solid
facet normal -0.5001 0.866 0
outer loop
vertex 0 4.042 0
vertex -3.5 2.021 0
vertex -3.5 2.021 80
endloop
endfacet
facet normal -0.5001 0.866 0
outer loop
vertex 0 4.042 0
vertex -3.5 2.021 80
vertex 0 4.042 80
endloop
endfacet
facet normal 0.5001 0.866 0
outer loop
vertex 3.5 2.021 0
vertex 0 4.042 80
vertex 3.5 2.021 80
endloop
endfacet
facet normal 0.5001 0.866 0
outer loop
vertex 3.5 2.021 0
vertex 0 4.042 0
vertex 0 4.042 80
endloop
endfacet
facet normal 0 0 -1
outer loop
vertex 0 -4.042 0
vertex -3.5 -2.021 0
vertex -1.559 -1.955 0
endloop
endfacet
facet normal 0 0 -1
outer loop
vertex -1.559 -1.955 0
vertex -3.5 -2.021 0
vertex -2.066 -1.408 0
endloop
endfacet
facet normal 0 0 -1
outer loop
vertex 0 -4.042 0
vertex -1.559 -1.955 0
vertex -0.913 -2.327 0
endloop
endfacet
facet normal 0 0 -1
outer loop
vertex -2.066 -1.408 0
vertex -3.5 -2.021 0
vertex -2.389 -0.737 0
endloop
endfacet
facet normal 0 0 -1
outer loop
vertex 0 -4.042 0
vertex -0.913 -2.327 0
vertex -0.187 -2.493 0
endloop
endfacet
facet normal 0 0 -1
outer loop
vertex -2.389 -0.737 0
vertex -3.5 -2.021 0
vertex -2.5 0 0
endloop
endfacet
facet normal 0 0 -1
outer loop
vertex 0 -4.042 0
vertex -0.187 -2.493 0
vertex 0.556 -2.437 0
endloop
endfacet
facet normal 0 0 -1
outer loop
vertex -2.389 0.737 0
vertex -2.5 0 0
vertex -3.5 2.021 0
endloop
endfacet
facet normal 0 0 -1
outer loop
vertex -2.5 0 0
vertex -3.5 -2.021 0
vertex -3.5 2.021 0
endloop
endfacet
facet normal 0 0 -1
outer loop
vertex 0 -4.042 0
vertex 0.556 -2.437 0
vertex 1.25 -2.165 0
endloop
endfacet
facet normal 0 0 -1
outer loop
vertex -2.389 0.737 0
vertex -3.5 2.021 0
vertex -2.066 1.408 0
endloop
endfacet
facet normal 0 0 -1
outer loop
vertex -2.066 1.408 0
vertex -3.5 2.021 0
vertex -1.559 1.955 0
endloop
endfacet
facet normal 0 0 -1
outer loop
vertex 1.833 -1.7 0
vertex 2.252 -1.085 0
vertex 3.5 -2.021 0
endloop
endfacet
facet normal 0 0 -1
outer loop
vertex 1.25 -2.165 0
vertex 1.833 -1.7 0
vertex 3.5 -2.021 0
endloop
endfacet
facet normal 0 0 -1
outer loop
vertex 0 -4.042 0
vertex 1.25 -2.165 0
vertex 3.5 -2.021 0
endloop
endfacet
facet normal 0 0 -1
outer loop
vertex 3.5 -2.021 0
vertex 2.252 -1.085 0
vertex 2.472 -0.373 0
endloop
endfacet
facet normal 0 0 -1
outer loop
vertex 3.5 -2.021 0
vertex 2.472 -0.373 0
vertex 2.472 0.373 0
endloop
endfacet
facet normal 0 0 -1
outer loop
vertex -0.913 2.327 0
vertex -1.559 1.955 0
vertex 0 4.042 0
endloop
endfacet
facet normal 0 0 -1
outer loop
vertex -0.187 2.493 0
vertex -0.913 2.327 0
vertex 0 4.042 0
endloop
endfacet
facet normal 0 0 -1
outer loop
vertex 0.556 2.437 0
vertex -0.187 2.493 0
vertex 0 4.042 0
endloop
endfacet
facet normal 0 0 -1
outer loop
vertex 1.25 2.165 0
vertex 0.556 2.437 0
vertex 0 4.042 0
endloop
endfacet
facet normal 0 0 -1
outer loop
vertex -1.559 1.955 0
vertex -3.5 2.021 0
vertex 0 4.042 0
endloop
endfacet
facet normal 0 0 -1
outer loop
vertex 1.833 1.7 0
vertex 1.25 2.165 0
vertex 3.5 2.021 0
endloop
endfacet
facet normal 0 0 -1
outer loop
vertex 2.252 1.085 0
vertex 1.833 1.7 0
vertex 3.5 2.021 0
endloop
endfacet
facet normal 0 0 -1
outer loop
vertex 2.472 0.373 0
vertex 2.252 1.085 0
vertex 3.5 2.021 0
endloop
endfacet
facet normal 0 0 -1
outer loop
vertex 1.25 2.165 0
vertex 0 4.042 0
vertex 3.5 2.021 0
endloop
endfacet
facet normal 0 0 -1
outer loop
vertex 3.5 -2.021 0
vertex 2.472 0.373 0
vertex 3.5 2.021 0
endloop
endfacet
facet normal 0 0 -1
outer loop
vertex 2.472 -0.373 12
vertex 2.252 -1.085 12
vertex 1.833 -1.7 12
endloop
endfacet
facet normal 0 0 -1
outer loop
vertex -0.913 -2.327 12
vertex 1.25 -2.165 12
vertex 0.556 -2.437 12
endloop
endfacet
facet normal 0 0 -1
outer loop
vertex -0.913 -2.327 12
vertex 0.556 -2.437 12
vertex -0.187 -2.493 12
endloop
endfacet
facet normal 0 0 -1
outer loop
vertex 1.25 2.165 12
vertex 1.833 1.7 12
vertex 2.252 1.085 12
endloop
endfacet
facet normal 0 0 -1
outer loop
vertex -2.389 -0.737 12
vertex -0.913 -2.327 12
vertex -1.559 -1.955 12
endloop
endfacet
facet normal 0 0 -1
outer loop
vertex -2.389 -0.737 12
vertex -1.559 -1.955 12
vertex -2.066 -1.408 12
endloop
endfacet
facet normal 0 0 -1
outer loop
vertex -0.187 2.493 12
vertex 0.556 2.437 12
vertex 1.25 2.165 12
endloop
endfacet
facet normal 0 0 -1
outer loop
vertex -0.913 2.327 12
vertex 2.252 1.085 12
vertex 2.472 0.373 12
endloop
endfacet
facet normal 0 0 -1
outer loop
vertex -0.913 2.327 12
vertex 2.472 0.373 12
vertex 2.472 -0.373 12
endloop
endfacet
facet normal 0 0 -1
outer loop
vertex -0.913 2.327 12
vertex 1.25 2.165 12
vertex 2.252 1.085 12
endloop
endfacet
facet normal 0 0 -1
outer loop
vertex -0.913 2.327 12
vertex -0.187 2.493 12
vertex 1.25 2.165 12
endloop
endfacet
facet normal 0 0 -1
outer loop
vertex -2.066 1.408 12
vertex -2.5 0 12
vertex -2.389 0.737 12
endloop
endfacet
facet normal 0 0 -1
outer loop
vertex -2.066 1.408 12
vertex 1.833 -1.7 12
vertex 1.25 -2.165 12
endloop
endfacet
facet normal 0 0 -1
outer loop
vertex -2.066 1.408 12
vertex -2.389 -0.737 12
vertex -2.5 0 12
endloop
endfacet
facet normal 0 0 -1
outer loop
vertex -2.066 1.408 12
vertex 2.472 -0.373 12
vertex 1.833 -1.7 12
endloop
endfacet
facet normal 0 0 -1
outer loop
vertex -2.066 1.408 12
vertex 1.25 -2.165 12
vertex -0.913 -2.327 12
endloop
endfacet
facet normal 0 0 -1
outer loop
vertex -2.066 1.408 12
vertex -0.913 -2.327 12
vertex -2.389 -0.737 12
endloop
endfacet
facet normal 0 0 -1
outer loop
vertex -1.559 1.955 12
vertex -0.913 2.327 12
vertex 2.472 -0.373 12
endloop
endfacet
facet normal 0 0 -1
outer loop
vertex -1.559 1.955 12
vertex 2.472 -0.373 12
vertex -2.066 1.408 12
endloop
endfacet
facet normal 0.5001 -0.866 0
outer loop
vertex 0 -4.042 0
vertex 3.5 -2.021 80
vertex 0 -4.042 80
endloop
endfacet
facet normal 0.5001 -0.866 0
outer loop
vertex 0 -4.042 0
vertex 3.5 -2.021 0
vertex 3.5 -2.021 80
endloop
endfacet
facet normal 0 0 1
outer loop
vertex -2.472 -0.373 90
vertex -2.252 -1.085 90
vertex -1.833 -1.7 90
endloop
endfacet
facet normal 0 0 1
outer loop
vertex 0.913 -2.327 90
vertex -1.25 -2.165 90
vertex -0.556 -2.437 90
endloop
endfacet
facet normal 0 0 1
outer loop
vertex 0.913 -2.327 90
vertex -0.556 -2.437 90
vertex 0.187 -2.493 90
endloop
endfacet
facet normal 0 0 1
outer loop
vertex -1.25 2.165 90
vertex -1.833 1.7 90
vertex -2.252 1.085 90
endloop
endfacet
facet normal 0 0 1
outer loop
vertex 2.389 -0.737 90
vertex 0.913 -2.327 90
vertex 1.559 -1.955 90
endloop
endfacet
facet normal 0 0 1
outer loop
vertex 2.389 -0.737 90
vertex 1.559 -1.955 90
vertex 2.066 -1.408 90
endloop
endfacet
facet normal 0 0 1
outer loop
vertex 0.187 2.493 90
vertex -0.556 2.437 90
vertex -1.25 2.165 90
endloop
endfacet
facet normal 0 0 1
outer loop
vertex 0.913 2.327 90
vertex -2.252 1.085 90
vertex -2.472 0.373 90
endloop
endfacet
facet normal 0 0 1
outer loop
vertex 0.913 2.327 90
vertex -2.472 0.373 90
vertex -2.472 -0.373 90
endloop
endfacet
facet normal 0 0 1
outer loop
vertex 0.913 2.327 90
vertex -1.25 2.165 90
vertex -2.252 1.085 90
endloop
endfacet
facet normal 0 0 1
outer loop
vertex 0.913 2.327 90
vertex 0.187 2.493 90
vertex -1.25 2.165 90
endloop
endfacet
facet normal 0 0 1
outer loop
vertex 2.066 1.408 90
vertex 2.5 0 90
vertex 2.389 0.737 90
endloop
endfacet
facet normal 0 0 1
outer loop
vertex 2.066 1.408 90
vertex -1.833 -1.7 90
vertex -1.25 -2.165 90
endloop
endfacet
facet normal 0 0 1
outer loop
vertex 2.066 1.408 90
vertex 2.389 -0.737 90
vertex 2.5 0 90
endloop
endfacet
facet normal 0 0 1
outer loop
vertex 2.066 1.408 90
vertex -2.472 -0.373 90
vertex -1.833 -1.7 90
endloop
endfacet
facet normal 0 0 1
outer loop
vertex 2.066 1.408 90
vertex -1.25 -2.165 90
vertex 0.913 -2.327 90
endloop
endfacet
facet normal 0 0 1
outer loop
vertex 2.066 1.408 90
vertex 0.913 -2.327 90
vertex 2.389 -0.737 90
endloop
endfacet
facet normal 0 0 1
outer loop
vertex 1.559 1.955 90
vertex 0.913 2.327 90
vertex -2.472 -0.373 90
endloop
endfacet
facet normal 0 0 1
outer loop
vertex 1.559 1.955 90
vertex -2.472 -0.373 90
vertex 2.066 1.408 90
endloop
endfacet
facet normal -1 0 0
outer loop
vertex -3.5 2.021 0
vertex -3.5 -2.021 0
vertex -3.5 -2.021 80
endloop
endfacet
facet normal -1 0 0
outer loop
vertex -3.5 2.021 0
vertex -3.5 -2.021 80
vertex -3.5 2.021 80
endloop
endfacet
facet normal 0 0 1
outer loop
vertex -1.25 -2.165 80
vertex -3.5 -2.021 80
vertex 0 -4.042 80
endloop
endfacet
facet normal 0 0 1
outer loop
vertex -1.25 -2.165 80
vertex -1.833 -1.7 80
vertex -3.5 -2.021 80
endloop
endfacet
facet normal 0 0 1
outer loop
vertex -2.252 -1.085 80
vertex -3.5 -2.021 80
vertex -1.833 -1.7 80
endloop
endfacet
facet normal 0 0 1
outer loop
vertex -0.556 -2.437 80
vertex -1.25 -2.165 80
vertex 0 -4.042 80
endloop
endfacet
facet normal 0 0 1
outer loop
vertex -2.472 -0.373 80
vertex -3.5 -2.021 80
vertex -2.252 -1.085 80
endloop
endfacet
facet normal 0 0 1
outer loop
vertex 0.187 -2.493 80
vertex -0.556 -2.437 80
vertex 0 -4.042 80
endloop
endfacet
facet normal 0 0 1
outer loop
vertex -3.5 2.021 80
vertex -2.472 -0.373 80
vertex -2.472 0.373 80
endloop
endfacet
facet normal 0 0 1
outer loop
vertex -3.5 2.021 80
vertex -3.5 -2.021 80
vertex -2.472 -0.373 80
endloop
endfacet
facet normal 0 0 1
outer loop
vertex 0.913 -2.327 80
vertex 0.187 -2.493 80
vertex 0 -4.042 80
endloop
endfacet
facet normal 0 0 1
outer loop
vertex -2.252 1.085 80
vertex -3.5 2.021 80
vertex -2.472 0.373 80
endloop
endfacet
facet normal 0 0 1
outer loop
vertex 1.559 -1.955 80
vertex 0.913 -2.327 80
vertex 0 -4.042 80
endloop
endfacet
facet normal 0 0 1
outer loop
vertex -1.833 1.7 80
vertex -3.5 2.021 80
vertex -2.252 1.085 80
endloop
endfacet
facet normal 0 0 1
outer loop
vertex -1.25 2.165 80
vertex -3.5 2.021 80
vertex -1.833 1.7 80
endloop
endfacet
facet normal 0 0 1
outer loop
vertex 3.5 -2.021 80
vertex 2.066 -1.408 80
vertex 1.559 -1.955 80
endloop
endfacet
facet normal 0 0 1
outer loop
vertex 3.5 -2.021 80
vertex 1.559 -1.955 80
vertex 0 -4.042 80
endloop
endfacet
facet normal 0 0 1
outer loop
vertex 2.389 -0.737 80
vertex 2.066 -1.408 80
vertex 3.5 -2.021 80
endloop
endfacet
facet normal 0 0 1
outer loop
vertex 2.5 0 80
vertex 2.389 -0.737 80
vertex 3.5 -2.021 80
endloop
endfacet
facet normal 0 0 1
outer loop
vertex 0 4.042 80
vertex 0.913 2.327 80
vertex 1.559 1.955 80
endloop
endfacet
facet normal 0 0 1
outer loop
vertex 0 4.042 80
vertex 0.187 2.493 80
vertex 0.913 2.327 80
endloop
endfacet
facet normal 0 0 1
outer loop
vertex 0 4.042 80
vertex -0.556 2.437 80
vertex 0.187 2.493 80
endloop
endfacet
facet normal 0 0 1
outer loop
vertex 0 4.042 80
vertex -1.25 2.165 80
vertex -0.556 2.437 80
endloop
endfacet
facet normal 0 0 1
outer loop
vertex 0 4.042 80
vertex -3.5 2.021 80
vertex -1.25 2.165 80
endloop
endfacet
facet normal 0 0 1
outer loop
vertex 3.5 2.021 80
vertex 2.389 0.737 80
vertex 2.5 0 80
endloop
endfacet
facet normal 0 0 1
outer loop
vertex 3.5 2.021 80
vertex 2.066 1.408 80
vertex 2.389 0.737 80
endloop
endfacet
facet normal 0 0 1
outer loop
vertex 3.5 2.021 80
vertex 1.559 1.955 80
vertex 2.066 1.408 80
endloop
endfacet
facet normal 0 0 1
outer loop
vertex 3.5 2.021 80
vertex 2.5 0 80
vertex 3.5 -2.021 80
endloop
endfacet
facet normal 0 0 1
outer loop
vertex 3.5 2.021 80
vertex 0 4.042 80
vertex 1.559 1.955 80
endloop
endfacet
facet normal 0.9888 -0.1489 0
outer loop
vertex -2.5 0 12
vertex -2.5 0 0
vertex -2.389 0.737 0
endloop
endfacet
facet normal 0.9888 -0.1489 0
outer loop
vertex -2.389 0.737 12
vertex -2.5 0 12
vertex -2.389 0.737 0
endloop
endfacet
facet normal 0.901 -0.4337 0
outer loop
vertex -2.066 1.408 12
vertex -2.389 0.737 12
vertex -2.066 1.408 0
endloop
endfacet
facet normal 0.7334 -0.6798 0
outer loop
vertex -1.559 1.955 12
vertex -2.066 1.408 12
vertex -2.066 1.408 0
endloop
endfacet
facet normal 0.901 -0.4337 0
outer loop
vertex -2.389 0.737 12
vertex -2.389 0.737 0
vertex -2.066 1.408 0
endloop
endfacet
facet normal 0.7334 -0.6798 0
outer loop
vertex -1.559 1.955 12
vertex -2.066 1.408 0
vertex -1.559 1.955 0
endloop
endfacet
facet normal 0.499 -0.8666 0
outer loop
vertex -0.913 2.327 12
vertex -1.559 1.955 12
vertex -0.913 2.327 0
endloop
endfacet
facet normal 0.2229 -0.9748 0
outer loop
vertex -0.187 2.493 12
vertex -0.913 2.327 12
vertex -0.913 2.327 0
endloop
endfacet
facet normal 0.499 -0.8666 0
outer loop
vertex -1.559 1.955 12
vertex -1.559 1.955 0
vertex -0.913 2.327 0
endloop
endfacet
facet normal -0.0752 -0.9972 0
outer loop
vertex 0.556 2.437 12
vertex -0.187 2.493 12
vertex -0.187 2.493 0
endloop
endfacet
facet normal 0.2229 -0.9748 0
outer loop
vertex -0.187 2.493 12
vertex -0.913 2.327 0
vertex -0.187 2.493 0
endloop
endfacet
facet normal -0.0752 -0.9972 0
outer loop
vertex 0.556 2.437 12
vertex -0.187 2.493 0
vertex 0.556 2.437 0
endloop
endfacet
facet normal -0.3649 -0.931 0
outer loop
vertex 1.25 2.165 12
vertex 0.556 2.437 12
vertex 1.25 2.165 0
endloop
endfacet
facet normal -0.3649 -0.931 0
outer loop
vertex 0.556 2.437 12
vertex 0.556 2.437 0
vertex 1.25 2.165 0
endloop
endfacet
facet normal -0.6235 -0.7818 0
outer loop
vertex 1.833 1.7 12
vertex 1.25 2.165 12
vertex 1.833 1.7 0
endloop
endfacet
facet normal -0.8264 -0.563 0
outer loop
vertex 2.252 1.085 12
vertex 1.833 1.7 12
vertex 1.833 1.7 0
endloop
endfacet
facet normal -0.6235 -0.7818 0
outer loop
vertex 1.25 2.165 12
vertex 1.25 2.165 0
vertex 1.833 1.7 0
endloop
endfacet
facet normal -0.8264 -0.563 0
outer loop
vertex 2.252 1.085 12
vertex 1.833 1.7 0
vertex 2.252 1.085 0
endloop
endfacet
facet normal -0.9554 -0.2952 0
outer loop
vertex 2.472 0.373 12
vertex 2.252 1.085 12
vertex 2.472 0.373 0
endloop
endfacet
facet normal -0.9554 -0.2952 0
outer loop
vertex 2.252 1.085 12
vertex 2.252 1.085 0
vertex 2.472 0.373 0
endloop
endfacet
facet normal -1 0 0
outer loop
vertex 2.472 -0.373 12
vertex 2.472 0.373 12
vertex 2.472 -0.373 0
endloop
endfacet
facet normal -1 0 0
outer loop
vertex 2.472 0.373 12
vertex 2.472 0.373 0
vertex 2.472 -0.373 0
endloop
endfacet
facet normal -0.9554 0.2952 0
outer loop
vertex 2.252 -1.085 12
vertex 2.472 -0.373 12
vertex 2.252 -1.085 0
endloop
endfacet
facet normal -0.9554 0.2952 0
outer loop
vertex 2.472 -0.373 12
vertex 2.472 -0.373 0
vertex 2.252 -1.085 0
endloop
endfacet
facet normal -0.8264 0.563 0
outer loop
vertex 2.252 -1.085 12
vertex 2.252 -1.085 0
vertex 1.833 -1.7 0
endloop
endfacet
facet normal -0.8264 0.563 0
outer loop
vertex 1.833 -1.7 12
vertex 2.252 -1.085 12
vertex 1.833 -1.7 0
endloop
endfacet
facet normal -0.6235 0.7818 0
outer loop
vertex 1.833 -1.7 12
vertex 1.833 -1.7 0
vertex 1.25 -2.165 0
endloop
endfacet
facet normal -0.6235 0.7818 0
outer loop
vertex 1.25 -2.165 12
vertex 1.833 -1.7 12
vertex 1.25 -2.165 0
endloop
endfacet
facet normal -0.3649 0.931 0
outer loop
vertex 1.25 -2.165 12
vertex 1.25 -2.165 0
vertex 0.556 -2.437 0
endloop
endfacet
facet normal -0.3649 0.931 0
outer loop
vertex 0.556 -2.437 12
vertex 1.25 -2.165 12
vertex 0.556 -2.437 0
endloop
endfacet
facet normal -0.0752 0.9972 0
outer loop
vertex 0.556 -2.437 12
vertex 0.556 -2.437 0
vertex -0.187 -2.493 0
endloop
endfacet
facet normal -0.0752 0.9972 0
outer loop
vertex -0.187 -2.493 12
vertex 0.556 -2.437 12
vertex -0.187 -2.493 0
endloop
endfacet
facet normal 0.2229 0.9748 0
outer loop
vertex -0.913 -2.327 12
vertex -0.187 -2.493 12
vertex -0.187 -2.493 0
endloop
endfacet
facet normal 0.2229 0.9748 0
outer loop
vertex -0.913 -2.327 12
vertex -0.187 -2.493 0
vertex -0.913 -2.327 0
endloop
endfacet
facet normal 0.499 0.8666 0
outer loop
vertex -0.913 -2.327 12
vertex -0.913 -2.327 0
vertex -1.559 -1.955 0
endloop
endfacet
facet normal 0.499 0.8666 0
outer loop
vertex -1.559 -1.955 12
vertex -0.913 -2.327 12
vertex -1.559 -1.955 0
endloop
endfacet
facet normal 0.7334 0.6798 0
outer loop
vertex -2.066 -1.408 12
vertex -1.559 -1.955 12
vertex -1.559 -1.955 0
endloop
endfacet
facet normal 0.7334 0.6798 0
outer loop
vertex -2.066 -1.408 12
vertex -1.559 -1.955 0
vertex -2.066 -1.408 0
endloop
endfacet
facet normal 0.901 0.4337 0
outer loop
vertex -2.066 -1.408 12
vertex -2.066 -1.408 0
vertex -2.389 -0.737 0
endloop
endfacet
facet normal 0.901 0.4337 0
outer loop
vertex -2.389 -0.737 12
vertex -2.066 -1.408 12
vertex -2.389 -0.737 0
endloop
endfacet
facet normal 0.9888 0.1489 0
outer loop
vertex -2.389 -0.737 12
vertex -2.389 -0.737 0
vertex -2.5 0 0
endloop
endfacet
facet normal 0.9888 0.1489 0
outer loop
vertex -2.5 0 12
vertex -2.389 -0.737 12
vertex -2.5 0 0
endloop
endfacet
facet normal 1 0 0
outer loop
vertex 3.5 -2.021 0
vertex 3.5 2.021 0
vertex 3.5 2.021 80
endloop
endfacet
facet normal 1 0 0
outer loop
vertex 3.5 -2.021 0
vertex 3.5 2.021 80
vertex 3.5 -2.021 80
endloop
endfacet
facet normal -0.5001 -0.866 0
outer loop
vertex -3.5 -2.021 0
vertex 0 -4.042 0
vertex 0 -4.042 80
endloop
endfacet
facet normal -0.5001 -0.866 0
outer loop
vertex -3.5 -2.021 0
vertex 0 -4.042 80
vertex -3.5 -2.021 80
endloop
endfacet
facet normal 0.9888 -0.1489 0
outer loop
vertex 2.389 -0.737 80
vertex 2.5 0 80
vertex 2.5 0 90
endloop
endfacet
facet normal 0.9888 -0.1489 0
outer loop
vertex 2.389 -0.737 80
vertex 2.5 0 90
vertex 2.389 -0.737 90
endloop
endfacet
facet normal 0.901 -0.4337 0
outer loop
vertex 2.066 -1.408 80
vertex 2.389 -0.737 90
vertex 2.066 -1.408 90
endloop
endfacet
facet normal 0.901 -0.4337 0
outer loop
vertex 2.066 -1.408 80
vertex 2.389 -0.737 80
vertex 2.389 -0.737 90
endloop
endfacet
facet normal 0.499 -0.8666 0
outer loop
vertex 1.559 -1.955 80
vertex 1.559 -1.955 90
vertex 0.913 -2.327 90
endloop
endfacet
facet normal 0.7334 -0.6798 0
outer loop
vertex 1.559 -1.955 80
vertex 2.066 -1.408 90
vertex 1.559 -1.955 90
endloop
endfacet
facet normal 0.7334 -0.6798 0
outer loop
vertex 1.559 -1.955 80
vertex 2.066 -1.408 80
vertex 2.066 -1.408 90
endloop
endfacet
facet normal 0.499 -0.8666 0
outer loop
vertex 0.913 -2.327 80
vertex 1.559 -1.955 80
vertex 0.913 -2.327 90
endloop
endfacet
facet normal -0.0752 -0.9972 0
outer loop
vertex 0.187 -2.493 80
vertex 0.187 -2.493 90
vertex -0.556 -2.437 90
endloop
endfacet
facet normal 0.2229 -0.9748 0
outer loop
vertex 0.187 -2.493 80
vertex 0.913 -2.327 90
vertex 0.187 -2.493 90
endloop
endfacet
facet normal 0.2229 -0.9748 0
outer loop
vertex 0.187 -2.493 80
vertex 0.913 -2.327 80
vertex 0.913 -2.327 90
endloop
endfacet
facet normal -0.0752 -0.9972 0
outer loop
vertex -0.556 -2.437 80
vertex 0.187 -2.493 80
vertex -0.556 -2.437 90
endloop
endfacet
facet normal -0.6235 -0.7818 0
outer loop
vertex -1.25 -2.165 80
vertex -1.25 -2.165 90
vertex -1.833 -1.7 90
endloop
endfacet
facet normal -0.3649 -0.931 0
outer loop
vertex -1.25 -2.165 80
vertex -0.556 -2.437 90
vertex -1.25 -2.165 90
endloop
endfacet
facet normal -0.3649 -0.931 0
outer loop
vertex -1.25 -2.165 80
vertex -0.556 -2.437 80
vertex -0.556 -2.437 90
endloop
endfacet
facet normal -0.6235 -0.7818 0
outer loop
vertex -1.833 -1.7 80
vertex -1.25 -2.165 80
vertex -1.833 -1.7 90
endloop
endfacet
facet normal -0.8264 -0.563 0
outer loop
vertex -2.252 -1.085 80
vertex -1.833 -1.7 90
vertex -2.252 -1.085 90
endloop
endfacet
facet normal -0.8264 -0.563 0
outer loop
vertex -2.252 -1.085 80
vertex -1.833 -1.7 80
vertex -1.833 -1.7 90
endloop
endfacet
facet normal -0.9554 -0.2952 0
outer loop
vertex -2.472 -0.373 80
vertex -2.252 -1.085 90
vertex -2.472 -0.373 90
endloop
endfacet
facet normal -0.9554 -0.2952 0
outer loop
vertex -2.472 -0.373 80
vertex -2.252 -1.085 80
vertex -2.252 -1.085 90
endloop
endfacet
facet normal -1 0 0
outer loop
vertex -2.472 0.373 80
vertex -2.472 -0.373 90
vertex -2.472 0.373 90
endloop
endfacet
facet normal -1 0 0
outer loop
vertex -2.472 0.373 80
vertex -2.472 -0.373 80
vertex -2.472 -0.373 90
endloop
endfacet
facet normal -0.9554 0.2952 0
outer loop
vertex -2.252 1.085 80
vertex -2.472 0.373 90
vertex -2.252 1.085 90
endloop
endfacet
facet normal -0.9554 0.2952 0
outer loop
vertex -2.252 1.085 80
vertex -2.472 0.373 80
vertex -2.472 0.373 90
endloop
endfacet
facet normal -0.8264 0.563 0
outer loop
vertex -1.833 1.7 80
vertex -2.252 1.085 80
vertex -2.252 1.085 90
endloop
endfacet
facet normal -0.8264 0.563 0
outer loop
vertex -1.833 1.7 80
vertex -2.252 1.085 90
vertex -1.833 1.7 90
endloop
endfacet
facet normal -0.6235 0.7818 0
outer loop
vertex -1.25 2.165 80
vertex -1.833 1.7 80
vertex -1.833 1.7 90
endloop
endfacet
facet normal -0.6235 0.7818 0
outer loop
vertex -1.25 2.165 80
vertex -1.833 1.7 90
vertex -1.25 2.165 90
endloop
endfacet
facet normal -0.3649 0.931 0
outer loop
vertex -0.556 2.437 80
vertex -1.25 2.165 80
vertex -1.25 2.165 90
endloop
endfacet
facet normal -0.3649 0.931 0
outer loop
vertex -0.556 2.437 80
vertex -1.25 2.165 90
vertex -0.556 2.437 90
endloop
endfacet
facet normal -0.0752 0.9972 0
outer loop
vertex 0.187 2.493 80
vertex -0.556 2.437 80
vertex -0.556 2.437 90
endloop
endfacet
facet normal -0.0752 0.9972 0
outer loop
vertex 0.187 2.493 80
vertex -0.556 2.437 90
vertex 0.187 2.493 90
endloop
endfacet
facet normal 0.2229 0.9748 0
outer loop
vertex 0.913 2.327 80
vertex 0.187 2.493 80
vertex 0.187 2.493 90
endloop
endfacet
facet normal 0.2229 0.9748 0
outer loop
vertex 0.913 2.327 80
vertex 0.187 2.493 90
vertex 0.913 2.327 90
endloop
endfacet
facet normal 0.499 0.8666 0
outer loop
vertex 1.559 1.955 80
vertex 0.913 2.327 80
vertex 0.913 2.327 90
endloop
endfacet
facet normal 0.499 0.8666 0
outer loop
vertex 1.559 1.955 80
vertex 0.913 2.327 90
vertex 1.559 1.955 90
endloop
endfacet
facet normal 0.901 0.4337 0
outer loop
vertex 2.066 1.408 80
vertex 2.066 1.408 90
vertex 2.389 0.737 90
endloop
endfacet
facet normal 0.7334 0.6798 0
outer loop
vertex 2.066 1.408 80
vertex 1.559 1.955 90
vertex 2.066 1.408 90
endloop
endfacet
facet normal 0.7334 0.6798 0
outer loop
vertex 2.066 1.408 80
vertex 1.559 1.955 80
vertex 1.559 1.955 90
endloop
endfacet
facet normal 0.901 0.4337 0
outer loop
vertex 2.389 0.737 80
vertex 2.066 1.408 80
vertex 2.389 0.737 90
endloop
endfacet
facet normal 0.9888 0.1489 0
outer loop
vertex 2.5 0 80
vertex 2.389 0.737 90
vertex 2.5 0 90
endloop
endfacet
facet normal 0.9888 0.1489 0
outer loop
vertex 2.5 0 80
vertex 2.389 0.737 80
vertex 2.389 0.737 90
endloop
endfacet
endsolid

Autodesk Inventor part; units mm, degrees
ref_plane "YZ Plane" through (0, 0, 0) normal (1, 0, 0) x (0, 1, 0)
ref_plane "XZ Plane" through (0, 0, 0) normal (0, 1, 0) x (-1, 0, 0)
ref_plane "XY Plane" through (0, 0, 0) normal (0, 0, 1) x (1, 0, 0)
sketch "スケッチ1" plane through (0, 0, 0) normal (0, 0, 1) x (1, 0, 0)
  circle A0 centre (0, 0) radius 3.5
  line L0 (3.5, -2.0207) -> (0, -4.0415)
  line L1 (0, -4.0415) -> (-3.5, -2.0207)
  line L2 (-3.5, -2.0207) -> (-3.5, 2.0207)
  line L3 (-3.5, 2.0207) -> (0, 4.0415)
  line L4 (0, 4.0415) -> (3.5, 2.0207)
  line L5 (3.5, 2.0207) -> (3.5, -2.0207)
  point P0 (3.5, 0)
  dimension "d0" = 7
extrude "押し出し1" add sketch "スケッチ1" along normal blind 80
sketch "スケッチ2" plane through (0, 0, 80) normal (0, 0, 1) x (1, 0, 0)
  circle A0 centre (0, 0) radius 2.5
  dimension "d3" = 5
sketch "スケッチ3" plane through (0, 0, 0) normal (0, 0, -1) x (-1, 0, 0)
  circle A0 centre (0, 0) radius 2.5
  dimension "d6" = 5
extrude "押し出し3" cut sketch "スケッチ3" against normal blind 12
extrude "押し出し4" add sketch "スケッチ2" along normal blind 10
thread "ねじ1" size "M5x0.8" class "6g" standard "ANSI Metric M Profile" full length
properties part number "六角支柱" material "鉄、ダクタイル鋳鉄"
